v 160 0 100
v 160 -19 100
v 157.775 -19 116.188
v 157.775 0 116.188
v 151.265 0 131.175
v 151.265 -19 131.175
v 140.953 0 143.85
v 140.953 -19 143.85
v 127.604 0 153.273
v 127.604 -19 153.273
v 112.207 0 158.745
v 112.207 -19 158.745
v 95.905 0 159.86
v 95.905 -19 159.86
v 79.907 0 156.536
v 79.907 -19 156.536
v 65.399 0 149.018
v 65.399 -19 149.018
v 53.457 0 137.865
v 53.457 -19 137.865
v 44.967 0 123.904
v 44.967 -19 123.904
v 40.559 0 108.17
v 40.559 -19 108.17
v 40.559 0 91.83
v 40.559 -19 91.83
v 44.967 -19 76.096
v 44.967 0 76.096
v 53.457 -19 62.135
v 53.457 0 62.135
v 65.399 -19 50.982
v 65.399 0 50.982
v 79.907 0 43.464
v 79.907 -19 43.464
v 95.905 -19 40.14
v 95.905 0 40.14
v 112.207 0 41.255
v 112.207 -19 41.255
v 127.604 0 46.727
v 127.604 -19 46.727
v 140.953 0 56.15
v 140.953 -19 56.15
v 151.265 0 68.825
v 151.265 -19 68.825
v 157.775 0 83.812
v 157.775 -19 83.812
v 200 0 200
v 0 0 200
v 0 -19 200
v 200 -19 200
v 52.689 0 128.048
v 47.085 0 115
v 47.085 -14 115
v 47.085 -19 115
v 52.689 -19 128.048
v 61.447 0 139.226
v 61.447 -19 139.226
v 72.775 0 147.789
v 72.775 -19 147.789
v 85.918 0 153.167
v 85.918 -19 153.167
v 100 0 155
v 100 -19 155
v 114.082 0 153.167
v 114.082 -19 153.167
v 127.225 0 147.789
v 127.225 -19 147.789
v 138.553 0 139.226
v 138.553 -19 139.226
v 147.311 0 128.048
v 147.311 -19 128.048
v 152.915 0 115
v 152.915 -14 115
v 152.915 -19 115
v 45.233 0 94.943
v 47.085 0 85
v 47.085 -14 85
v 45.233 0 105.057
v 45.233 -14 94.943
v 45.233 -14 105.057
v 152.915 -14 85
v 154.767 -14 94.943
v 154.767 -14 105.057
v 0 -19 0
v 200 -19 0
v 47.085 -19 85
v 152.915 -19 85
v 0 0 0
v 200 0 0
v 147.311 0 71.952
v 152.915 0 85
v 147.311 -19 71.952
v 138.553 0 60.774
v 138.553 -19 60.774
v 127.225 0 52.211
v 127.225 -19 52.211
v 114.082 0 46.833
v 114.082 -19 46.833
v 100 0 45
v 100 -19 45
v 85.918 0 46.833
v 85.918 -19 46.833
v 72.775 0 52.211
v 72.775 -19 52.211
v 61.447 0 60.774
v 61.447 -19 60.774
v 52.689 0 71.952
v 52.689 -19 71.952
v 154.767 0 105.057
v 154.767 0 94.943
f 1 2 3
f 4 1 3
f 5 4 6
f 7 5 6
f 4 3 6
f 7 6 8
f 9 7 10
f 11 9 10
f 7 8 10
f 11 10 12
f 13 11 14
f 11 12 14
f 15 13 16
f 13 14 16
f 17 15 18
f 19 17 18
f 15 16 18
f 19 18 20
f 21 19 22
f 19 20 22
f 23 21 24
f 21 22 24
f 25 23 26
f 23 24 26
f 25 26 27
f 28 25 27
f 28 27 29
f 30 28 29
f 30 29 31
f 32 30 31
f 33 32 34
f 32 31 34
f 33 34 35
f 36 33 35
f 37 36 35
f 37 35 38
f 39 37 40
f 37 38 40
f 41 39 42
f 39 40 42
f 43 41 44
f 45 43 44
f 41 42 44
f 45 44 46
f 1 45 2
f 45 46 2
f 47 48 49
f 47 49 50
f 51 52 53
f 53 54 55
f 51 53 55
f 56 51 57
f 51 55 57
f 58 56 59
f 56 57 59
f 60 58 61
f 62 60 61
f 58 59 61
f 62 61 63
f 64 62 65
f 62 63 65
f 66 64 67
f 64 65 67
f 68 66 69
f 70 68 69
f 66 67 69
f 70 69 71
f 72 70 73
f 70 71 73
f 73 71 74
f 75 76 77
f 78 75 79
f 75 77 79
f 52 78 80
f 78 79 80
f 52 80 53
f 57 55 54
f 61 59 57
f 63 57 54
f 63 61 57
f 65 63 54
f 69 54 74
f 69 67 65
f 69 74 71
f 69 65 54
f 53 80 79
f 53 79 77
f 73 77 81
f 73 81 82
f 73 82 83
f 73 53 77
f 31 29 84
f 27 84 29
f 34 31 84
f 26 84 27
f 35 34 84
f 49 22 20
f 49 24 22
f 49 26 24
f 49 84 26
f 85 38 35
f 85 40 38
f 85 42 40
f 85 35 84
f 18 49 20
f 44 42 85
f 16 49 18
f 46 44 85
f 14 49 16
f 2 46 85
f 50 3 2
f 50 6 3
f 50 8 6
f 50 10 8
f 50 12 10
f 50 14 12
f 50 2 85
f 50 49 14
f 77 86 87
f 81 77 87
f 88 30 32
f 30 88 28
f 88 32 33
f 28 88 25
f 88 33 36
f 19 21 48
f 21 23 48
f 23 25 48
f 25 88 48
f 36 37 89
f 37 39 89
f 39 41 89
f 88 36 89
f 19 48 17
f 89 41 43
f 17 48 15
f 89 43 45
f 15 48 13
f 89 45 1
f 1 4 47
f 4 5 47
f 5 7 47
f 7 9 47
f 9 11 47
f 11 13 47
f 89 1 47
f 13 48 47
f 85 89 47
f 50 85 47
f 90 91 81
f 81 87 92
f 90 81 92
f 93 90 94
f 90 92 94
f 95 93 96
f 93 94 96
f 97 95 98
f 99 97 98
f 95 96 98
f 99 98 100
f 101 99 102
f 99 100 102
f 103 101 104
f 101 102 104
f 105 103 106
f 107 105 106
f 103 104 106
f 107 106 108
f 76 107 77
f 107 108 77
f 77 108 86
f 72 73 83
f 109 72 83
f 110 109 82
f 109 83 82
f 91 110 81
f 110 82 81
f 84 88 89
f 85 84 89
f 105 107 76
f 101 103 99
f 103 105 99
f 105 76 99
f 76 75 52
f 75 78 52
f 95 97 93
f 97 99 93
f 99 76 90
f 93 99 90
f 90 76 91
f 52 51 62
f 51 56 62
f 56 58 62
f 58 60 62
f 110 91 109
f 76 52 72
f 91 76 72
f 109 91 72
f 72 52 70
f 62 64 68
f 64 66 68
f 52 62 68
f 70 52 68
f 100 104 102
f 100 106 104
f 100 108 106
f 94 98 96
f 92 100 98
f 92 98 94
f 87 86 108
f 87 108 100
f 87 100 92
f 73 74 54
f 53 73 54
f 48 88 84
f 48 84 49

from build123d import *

# Parameters (mm, degrees)
F0_W     = 200
F0_H     = 200
F1_DEPTH = 19
F3_DEPTH = 5
F2_R     = 60
F4_DEPTH = 19


with BuildPart() as f1:
    # F0 (on Front) → F1 (new body)
    with BuildSketch(Plane.XZ):
        with Locations((100, 100)):
            Rectangle(F0_W, F0_H)
    extrude(amount=F1_DEPTH)

    # F2 (on face) → F3 (cut)
    with BuildSketch(Plane.XZ.offset(19)):
        with BuildLine():
            Line((152.915026, 115), (47.084974, 115))
            ThreePointArc((47.084974, 115), (45, 100), (47.084974, 85))
            Line((47.084974, 85), (152.915026, 85))
            ThreePointArc((152.915026, 85), (155, 100), (152.915026, 115))
        make_face()
    extrude(amount=-F3_DEPTH, mode=Mode.SUBTRACT)

    # F2 (on face) → F4 (cut)
    with BuildSketch(Plane.XZ.offset(19)):
        with Locations((100, 100)):
            Circle(F2_R)
        with BuildLine():
            ThreePointArc((47.084974, 85), (45, 100), (47.084974, 115))
            ThreePointArc((47.084974, 115), (100, 155), (152.915026, 115))
            ThreePointArc((152.915026, 115), (155, 100), (152.915026, 85))
            ThreePointArc((152.915026, 85), (100, 45), (47.084974, 85))
        make_face(mode=Mode.SUBTRACT)
    extrude(amount=-F4_DEPTH, mode=Mode.SUBTRACT)


solid = f1.part
